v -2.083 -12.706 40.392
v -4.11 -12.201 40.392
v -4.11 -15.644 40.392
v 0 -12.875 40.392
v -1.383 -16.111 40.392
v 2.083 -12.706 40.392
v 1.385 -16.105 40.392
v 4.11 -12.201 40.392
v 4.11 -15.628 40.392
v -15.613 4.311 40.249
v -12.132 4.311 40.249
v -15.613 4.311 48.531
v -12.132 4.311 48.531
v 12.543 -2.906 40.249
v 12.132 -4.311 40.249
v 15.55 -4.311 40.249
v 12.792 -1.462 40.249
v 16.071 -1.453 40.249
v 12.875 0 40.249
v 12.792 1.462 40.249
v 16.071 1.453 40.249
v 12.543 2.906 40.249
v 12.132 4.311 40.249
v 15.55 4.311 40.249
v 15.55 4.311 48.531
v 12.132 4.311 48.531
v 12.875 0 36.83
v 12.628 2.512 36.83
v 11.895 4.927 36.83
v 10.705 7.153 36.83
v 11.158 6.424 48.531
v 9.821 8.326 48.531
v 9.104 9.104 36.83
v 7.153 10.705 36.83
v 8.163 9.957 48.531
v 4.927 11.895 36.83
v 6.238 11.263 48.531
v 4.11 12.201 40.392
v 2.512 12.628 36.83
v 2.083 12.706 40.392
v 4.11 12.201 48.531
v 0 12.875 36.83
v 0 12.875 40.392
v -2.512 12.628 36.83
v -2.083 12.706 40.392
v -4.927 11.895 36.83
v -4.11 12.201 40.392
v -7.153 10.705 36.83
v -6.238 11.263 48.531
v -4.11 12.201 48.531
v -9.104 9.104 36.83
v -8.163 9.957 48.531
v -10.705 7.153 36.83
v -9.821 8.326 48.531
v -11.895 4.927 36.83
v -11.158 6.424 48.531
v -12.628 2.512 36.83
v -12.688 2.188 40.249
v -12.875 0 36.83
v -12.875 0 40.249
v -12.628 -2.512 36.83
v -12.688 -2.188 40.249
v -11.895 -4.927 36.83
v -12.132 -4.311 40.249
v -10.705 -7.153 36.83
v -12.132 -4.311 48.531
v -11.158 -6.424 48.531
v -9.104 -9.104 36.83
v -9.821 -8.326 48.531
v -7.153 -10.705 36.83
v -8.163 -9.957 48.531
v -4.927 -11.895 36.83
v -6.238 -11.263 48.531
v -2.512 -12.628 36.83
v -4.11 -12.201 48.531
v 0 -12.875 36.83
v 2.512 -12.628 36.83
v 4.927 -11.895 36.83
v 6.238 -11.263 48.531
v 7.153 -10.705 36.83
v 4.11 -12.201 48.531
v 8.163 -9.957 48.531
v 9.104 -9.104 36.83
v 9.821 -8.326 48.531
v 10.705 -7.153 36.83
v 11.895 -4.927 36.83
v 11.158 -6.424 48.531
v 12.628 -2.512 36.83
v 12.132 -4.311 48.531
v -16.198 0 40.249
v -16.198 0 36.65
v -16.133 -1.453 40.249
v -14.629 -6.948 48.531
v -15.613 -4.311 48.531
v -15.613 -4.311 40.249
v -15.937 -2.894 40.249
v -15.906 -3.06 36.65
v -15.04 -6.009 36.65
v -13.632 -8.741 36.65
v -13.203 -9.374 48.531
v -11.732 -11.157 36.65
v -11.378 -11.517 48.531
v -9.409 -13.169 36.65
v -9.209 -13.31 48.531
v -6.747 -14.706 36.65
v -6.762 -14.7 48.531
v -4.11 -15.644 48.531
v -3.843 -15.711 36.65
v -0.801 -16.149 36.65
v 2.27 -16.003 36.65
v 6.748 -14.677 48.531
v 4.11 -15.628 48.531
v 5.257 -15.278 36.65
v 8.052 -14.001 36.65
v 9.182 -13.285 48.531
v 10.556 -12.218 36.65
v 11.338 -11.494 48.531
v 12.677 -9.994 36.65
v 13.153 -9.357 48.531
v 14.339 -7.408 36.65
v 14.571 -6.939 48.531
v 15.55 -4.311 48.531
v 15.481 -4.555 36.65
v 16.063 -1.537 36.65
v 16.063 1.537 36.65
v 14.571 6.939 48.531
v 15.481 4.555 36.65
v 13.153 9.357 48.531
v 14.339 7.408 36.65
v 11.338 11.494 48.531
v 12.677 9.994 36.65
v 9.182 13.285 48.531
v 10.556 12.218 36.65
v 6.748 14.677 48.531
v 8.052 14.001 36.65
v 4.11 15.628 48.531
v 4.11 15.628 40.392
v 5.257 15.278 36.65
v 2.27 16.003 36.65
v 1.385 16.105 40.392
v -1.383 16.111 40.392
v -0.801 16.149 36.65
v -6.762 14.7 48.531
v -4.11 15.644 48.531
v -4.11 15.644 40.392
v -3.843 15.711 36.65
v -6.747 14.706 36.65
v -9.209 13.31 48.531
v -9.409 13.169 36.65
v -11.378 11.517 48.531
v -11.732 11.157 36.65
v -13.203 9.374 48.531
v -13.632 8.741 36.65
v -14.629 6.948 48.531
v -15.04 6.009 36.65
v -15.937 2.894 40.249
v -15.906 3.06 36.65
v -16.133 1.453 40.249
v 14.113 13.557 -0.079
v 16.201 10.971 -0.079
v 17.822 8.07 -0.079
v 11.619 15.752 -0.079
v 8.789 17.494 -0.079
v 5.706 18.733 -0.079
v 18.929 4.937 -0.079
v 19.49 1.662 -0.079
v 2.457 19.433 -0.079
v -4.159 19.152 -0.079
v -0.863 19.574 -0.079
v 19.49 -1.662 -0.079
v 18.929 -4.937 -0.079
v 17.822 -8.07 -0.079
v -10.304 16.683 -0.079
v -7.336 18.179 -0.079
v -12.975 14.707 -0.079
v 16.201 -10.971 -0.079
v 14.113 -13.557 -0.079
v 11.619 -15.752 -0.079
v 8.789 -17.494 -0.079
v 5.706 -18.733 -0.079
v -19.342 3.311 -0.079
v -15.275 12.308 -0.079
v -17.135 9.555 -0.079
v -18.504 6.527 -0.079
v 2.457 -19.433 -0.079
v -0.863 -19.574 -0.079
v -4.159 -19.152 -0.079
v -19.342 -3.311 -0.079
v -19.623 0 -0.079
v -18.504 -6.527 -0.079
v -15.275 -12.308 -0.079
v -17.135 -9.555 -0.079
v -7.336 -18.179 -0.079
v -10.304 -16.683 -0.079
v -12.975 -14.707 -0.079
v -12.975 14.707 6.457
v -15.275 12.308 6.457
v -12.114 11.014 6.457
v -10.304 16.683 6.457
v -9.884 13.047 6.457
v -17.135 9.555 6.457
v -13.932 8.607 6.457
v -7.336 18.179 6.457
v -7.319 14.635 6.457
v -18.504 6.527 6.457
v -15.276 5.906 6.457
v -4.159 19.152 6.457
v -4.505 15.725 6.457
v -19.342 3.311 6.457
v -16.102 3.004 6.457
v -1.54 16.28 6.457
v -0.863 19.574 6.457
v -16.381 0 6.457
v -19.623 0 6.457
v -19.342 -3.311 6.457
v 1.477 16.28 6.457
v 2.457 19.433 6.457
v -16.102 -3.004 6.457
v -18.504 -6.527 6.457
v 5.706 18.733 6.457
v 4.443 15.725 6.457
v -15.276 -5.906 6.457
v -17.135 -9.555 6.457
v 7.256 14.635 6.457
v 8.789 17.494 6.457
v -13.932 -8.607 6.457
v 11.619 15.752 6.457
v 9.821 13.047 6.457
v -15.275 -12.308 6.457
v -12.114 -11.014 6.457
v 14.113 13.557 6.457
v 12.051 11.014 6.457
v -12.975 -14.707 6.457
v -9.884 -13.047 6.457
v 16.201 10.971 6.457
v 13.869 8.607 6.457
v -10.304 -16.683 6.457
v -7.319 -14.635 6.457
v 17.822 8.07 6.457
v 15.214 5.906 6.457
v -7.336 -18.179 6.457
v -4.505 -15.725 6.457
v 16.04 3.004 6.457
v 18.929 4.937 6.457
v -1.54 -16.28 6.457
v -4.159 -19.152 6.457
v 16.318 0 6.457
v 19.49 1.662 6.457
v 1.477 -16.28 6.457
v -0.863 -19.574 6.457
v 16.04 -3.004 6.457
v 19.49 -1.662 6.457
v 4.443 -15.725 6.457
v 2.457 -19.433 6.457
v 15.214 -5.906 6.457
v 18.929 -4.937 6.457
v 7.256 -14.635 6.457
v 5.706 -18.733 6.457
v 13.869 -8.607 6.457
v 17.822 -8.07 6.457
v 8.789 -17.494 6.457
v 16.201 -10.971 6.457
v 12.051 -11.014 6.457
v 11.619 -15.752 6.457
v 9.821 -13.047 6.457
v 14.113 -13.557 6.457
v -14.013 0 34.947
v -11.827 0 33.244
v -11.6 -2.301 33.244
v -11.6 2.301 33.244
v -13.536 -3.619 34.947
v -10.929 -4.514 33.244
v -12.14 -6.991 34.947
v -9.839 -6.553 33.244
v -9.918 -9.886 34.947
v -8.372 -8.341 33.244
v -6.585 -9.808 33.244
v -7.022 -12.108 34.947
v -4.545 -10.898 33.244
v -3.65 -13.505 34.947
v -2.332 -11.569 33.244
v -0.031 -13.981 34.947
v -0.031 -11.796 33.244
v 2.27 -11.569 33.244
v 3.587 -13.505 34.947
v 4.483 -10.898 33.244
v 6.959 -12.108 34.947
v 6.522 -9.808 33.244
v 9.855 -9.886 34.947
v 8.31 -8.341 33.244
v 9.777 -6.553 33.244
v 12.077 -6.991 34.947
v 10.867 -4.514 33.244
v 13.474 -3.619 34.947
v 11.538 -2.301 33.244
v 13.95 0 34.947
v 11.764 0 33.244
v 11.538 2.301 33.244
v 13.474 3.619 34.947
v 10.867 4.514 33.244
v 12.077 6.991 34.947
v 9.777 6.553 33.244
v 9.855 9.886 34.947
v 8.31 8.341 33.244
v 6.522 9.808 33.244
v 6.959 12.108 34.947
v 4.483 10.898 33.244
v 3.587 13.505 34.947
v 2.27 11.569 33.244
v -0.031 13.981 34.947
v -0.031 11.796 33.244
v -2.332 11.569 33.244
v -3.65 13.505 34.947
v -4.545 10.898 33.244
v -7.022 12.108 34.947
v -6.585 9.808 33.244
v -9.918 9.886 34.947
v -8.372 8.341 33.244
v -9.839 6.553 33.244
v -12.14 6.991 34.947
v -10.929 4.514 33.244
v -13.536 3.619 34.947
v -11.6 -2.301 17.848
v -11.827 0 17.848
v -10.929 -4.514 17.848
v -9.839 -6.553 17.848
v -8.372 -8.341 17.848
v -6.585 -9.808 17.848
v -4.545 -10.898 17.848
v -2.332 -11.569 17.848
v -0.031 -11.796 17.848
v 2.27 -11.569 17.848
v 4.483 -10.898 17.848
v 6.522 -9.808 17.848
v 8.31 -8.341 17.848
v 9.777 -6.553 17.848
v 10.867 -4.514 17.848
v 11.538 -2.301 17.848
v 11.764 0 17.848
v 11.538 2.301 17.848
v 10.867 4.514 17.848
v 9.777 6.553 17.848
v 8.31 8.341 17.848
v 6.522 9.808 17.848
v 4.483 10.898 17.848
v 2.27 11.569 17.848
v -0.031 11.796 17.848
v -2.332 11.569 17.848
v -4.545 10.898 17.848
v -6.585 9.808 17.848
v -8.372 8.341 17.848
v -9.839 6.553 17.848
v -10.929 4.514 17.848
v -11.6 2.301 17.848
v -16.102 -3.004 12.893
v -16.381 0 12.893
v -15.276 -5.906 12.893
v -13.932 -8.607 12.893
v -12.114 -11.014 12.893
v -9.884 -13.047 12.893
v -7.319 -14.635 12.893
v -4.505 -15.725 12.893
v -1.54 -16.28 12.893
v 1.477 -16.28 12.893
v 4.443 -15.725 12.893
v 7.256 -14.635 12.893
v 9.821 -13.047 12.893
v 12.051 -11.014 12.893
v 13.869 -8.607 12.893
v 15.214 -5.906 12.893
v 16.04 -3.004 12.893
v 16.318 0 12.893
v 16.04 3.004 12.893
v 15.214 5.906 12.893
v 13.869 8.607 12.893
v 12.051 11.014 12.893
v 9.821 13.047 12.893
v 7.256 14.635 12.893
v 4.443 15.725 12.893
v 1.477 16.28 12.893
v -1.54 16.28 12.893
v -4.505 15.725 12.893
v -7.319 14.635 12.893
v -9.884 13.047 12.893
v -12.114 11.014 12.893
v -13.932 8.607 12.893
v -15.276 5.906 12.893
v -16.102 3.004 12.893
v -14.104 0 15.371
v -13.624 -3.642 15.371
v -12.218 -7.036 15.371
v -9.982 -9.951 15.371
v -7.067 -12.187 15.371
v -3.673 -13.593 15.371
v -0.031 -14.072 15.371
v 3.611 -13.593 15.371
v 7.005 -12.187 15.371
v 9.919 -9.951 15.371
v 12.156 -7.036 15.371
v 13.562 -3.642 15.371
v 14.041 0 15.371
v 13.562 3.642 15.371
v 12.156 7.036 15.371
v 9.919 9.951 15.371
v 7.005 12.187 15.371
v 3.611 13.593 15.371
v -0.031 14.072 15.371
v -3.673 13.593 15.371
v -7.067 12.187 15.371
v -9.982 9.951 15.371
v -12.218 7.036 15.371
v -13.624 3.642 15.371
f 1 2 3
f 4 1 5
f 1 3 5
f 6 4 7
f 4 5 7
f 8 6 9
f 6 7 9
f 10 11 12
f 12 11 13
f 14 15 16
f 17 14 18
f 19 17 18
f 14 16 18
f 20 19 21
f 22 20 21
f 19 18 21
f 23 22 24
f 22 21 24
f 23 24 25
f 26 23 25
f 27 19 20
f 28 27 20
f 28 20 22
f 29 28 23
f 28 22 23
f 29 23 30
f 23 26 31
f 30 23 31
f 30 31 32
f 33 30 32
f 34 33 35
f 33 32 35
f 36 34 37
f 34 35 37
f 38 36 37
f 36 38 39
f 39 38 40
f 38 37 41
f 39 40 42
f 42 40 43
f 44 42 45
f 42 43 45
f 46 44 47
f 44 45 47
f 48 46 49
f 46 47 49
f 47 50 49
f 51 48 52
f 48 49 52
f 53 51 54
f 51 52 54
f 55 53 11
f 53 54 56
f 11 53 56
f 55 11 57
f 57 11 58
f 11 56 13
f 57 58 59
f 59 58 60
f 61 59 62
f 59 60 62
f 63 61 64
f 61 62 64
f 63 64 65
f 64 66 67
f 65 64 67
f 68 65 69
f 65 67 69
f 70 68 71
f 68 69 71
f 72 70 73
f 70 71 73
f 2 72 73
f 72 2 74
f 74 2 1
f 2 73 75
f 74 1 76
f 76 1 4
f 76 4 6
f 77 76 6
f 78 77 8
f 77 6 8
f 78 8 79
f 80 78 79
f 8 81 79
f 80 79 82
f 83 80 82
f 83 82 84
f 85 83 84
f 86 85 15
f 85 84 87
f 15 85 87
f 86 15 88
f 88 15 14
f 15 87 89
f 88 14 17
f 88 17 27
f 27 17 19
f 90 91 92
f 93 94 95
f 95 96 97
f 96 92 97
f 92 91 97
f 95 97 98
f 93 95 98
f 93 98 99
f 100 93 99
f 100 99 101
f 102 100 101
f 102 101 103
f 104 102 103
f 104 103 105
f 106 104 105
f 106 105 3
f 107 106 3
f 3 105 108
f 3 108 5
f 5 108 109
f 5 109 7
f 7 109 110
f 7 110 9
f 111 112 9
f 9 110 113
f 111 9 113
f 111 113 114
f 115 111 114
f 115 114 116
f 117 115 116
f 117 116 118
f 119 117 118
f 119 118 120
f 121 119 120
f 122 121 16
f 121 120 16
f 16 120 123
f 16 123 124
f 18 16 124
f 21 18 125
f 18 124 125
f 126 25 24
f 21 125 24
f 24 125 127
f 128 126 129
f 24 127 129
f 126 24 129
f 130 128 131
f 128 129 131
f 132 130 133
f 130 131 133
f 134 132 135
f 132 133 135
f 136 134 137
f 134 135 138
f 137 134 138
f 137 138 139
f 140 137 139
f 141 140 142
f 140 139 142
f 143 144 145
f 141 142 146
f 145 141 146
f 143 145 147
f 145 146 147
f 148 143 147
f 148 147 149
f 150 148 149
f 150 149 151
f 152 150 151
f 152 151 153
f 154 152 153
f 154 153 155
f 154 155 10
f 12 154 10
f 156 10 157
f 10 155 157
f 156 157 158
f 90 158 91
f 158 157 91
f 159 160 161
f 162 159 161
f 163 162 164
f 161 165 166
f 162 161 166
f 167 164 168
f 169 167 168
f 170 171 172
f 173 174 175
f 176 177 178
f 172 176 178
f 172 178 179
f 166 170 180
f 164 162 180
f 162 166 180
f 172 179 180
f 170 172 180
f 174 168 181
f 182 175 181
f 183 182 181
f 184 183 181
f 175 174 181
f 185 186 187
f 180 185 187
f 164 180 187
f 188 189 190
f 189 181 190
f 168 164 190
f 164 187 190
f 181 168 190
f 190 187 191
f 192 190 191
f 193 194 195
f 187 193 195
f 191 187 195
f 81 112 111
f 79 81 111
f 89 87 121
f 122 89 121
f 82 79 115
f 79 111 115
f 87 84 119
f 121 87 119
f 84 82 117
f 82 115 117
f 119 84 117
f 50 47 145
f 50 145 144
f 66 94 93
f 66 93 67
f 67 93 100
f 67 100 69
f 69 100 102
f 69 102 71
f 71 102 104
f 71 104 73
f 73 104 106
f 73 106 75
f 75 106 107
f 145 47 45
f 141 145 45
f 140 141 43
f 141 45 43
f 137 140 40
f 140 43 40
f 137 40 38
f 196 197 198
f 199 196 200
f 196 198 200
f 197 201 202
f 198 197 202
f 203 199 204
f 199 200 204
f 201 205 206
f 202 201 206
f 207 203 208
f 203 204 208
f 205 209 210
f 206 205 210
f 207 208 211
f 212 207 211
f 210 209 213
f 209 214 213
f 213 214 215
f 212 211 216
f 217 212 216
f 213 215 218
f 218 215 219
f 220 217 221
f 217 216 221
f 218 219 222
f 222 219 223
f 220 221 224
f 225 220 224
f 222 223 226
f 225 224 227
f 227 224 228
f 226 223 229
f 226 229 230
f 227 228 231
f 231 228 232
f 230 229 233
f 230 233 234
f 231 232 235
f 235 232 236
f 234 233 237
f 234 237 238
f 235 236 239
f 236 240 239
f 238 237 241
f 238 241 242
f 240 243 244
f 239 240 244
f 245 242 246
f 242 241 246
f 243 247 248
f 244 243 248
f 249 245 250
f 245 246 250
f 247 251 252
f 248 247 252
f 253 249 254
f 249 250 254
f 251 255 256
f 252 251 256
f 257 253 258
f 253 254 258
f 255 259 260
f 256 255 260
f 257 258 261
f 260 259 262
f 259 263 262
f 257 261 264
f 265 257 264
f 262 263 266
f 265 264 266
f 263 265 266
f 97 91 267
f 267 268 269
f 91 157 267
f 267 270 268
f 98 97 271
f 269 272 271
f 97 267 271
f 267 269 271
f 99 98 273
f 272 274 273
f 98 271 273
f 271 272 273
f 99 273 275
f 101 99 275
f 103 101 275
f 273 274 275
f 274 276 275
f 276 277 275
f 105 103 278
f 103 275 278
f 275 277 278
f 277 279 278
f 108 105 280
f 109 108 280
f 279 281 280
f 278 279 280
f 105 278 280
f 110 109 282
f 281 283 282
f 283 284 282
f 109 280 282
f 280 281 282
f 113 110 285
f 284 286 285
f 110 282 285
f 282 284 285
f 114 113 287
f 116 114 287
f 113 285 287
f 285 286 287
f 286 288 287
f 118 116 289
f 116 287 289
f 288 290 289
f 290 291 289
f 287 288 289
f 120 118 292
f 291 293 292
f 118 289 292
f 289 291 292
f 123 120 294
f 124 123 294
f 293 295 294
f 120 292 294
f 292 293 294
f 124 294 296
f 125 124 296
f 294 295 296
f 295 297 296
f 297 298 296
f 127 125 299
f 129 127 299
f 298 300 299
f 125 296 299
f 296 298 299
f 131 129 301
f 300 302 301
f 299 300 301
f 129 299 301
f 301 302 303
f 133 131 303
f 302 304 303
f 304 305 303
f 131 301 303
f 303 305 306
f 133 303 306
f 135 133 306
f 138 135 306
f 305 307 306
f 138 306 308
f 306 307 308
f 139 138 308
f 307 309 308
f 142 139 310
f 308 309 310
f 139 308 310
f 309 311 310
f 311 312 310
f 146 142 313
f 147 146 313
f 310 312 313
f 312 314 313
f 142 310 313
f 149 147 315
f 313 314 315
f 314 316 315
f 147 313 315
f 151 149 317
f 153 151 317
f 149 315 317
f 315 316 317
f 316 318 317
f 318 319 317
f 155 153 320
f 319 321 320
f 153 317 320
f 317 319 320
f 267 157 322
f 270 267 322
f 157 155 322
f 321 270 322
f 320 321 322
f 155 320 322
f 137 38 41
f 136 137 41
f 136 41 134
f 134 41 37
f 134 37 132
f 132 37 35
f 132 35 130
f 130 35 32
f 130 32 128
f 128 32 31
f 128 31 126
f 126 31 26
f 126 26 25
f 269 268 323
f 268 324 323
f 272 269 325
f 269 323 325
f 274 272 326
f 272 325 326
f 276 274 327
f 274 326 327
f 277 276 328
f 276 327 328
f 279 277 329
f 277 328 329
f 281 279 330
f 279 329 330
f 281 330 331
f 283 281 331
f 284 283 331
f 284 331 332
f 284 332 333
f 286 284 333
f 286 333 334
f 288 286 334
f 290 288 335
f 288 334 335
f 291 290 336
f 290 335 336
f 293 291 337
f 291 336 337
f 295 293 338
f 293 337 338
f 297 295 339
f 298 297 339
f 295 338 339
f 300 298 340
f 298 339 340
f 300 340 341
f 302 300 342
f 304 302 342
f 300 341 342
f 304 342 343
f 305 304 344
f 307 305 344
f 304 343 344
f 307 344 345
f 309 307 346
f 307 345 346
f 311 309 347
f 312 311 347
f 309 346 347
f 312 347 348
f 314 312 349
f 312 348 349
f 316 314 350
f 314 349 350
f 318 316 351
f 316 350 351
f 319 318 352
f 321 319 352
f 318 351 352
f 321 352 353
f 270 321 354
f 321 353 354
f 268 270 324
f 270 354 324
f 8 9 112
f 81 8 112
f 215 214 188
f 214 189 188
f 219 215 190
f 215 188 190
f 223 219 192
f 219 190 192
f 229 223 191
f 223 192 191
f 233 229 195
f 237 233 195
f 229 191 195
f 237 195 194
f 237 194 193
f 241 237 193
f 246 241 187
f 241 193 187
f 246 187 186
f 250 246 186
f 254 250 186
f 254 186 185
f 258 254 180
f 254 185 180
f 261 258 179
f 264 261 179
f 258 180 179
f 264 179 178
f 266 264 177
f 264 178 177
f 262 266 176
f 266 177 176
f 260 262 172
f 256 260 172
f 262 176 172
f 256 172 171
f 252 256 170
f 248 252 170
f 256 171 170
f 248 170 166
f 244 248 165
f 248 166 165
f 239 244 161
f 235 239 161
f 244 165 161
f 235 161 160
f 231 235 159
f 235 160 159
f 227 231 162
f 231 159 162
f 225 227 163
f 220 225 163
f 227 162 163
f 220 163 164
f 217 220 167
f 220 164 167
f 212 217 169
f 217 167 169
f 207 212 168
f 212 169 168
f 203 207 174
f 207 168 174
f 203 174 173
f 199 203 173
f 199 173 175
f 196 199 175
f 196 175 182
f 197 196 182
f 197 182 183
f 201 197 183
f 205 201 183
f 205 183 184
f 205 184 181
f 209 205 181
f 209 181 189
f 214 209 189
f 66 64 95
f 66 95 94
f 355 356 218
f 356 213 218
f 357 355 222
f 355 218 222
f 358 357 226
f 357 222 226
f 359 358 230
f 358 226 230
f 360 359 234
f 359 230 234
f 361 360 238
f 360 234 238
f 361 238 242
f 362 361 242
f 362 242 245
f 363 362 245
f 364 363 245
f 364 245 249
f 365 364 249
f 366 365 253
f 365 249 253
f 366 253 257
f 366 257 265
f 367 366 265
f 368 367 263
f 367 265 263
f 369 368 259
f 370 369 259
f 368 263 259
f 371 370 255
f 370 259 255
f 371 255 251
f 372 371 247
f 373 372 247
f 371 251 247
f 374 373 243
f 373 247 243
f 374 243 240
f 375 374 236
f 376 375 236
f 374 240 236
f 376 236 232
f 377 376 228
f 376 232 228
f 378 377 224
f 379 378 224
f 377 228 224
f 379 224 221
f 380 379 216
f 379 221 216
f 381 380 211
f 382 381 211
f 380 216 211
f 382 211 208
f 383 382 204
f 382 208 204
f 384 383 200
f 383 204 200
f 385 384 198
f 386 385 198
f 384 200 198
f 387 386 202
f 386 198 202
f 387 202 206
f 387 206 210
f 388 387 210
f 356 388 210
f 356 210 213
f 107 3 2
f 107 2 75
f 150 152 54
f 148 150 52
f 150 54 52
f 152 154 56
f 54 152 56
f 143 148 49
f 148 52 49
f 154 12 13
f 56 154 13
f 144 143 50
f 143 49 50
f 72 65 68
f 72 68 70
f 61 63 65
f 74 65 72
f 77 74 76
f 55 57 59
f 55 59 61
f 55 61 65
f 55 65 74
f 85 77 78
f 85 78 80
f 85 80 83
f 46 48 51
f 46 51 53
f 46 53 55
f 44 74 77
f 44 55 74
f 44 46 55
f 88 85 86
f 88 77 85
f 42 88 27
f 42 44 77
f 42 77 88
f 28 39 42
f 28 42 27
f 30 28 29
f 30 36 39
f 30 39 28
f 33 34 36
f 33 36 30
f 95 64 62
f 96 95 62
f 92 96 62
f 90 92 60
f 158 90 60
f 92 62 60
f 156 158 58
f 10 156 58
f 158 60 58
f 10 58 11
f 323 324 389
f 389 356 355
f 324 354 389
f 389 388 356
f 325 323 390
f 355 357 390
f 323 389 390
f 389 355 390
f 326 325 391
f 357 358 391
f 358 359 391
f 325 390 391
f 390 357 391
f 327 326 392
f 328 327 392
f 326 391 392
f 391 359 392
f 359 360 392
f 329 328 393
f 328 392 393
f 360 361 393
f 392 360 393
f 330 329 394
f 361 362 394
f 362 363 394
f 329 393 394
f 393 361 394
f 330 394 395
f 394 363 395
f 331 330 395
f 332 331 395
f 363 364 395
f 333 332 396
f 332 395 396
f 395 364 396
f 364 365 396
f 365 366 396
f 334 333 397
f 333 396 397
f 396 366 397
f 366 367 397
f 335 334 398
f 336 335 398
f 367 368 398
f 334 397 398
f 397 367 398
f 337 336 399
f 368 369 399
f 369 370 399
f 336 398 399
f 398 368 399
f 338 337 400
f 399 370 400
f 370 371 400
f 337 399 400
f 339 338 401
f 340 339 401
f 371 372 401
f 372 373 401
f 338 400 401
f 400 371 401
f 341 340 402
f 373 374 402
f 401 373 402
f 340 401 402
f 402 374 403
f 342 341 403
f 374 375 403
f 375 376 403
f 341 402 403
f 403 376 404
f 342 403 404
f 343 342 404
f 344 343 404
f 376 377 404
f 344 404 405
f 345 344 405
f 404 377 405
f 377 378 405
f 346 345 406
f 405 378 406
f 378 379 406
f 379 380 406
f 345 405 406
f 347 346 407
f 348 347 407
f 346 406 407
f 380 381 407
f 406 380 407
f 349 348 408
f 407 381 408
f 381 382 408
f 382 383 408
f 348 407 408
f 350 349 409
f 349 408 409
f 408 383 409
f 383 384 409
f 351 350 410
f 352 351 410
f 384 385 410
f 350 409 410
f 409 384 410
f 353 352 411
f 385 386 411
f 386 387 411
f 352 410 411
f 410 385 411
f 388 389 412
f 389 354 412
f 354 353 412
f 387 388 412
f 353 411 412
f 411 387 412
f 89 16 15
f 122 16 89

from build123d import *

# Parameters (mm, degrees)
F4_R     = 12.875258
F5_DEPTH = 12.7
F6_W     = 8.22093
F6_H     = 18.559195
F7_DEPTH = 25.4
F8_W     = 8.622916
F8_H     = 18.559195
F9_DEPTH = 25.4


with BuildPart() as f1:
    # F0 (on Front) → F1 (revolve)
    with BuildSketch(Plane.XZ):
        Polygon((-34.6094, 4.425088), (-34.6094, -2.110543), (-15.017255, -2.110543), (-15.017255, 46.499304), (-20.429717, 46.499304), (-20.429717, 42.830415), (-24.66305, 42.830415), (-24.66305, 46.499304), (-31.18447, 46.499304), (-31.18447, 34.617999), (-26.812965, 31.212292), (-26.812965, 15.816283), (-31.366523, 10.860938), (-31.366523, 4.425088), align=None)
    revolve(axis=Axis((-15.017255, 0, 22.194381), (0, 0, 1)))


with BuildPart() as f1_1:
    # F2: moved
    add(f1.part.moved(Location((14.986, 0, 2.032))))

    # F4 (on offset) → F5 (cut)
    with BuildSketch(Plane.XY.offset(49.53)):
        Circle(F4_R)
    extrude(amount=-F5_DEPTH, mode=Mode.SUBTRACT)

    # F6 (on Front) → F7 (cut, symmetric)
    with BuildSketch(Plane.XZ):
        with Locations((0, 49.671471)):
            Rectangle(F6_W, F6_H)
    extrude(amount=F7_DEPTH, both=True, mode=Mode.SUBTRACT)

    # F8 (on Right) → F9 (cut, symmetric)
    with BuildSketch(Plane.YZ):
        with Locations((0, 49.528695)):
            Rectangle(F8_W, F8_H)
    extrude(amount=F9_DEPTH, both=True, mode=Mode.SUBTRACT)


solid = f1_1.part
